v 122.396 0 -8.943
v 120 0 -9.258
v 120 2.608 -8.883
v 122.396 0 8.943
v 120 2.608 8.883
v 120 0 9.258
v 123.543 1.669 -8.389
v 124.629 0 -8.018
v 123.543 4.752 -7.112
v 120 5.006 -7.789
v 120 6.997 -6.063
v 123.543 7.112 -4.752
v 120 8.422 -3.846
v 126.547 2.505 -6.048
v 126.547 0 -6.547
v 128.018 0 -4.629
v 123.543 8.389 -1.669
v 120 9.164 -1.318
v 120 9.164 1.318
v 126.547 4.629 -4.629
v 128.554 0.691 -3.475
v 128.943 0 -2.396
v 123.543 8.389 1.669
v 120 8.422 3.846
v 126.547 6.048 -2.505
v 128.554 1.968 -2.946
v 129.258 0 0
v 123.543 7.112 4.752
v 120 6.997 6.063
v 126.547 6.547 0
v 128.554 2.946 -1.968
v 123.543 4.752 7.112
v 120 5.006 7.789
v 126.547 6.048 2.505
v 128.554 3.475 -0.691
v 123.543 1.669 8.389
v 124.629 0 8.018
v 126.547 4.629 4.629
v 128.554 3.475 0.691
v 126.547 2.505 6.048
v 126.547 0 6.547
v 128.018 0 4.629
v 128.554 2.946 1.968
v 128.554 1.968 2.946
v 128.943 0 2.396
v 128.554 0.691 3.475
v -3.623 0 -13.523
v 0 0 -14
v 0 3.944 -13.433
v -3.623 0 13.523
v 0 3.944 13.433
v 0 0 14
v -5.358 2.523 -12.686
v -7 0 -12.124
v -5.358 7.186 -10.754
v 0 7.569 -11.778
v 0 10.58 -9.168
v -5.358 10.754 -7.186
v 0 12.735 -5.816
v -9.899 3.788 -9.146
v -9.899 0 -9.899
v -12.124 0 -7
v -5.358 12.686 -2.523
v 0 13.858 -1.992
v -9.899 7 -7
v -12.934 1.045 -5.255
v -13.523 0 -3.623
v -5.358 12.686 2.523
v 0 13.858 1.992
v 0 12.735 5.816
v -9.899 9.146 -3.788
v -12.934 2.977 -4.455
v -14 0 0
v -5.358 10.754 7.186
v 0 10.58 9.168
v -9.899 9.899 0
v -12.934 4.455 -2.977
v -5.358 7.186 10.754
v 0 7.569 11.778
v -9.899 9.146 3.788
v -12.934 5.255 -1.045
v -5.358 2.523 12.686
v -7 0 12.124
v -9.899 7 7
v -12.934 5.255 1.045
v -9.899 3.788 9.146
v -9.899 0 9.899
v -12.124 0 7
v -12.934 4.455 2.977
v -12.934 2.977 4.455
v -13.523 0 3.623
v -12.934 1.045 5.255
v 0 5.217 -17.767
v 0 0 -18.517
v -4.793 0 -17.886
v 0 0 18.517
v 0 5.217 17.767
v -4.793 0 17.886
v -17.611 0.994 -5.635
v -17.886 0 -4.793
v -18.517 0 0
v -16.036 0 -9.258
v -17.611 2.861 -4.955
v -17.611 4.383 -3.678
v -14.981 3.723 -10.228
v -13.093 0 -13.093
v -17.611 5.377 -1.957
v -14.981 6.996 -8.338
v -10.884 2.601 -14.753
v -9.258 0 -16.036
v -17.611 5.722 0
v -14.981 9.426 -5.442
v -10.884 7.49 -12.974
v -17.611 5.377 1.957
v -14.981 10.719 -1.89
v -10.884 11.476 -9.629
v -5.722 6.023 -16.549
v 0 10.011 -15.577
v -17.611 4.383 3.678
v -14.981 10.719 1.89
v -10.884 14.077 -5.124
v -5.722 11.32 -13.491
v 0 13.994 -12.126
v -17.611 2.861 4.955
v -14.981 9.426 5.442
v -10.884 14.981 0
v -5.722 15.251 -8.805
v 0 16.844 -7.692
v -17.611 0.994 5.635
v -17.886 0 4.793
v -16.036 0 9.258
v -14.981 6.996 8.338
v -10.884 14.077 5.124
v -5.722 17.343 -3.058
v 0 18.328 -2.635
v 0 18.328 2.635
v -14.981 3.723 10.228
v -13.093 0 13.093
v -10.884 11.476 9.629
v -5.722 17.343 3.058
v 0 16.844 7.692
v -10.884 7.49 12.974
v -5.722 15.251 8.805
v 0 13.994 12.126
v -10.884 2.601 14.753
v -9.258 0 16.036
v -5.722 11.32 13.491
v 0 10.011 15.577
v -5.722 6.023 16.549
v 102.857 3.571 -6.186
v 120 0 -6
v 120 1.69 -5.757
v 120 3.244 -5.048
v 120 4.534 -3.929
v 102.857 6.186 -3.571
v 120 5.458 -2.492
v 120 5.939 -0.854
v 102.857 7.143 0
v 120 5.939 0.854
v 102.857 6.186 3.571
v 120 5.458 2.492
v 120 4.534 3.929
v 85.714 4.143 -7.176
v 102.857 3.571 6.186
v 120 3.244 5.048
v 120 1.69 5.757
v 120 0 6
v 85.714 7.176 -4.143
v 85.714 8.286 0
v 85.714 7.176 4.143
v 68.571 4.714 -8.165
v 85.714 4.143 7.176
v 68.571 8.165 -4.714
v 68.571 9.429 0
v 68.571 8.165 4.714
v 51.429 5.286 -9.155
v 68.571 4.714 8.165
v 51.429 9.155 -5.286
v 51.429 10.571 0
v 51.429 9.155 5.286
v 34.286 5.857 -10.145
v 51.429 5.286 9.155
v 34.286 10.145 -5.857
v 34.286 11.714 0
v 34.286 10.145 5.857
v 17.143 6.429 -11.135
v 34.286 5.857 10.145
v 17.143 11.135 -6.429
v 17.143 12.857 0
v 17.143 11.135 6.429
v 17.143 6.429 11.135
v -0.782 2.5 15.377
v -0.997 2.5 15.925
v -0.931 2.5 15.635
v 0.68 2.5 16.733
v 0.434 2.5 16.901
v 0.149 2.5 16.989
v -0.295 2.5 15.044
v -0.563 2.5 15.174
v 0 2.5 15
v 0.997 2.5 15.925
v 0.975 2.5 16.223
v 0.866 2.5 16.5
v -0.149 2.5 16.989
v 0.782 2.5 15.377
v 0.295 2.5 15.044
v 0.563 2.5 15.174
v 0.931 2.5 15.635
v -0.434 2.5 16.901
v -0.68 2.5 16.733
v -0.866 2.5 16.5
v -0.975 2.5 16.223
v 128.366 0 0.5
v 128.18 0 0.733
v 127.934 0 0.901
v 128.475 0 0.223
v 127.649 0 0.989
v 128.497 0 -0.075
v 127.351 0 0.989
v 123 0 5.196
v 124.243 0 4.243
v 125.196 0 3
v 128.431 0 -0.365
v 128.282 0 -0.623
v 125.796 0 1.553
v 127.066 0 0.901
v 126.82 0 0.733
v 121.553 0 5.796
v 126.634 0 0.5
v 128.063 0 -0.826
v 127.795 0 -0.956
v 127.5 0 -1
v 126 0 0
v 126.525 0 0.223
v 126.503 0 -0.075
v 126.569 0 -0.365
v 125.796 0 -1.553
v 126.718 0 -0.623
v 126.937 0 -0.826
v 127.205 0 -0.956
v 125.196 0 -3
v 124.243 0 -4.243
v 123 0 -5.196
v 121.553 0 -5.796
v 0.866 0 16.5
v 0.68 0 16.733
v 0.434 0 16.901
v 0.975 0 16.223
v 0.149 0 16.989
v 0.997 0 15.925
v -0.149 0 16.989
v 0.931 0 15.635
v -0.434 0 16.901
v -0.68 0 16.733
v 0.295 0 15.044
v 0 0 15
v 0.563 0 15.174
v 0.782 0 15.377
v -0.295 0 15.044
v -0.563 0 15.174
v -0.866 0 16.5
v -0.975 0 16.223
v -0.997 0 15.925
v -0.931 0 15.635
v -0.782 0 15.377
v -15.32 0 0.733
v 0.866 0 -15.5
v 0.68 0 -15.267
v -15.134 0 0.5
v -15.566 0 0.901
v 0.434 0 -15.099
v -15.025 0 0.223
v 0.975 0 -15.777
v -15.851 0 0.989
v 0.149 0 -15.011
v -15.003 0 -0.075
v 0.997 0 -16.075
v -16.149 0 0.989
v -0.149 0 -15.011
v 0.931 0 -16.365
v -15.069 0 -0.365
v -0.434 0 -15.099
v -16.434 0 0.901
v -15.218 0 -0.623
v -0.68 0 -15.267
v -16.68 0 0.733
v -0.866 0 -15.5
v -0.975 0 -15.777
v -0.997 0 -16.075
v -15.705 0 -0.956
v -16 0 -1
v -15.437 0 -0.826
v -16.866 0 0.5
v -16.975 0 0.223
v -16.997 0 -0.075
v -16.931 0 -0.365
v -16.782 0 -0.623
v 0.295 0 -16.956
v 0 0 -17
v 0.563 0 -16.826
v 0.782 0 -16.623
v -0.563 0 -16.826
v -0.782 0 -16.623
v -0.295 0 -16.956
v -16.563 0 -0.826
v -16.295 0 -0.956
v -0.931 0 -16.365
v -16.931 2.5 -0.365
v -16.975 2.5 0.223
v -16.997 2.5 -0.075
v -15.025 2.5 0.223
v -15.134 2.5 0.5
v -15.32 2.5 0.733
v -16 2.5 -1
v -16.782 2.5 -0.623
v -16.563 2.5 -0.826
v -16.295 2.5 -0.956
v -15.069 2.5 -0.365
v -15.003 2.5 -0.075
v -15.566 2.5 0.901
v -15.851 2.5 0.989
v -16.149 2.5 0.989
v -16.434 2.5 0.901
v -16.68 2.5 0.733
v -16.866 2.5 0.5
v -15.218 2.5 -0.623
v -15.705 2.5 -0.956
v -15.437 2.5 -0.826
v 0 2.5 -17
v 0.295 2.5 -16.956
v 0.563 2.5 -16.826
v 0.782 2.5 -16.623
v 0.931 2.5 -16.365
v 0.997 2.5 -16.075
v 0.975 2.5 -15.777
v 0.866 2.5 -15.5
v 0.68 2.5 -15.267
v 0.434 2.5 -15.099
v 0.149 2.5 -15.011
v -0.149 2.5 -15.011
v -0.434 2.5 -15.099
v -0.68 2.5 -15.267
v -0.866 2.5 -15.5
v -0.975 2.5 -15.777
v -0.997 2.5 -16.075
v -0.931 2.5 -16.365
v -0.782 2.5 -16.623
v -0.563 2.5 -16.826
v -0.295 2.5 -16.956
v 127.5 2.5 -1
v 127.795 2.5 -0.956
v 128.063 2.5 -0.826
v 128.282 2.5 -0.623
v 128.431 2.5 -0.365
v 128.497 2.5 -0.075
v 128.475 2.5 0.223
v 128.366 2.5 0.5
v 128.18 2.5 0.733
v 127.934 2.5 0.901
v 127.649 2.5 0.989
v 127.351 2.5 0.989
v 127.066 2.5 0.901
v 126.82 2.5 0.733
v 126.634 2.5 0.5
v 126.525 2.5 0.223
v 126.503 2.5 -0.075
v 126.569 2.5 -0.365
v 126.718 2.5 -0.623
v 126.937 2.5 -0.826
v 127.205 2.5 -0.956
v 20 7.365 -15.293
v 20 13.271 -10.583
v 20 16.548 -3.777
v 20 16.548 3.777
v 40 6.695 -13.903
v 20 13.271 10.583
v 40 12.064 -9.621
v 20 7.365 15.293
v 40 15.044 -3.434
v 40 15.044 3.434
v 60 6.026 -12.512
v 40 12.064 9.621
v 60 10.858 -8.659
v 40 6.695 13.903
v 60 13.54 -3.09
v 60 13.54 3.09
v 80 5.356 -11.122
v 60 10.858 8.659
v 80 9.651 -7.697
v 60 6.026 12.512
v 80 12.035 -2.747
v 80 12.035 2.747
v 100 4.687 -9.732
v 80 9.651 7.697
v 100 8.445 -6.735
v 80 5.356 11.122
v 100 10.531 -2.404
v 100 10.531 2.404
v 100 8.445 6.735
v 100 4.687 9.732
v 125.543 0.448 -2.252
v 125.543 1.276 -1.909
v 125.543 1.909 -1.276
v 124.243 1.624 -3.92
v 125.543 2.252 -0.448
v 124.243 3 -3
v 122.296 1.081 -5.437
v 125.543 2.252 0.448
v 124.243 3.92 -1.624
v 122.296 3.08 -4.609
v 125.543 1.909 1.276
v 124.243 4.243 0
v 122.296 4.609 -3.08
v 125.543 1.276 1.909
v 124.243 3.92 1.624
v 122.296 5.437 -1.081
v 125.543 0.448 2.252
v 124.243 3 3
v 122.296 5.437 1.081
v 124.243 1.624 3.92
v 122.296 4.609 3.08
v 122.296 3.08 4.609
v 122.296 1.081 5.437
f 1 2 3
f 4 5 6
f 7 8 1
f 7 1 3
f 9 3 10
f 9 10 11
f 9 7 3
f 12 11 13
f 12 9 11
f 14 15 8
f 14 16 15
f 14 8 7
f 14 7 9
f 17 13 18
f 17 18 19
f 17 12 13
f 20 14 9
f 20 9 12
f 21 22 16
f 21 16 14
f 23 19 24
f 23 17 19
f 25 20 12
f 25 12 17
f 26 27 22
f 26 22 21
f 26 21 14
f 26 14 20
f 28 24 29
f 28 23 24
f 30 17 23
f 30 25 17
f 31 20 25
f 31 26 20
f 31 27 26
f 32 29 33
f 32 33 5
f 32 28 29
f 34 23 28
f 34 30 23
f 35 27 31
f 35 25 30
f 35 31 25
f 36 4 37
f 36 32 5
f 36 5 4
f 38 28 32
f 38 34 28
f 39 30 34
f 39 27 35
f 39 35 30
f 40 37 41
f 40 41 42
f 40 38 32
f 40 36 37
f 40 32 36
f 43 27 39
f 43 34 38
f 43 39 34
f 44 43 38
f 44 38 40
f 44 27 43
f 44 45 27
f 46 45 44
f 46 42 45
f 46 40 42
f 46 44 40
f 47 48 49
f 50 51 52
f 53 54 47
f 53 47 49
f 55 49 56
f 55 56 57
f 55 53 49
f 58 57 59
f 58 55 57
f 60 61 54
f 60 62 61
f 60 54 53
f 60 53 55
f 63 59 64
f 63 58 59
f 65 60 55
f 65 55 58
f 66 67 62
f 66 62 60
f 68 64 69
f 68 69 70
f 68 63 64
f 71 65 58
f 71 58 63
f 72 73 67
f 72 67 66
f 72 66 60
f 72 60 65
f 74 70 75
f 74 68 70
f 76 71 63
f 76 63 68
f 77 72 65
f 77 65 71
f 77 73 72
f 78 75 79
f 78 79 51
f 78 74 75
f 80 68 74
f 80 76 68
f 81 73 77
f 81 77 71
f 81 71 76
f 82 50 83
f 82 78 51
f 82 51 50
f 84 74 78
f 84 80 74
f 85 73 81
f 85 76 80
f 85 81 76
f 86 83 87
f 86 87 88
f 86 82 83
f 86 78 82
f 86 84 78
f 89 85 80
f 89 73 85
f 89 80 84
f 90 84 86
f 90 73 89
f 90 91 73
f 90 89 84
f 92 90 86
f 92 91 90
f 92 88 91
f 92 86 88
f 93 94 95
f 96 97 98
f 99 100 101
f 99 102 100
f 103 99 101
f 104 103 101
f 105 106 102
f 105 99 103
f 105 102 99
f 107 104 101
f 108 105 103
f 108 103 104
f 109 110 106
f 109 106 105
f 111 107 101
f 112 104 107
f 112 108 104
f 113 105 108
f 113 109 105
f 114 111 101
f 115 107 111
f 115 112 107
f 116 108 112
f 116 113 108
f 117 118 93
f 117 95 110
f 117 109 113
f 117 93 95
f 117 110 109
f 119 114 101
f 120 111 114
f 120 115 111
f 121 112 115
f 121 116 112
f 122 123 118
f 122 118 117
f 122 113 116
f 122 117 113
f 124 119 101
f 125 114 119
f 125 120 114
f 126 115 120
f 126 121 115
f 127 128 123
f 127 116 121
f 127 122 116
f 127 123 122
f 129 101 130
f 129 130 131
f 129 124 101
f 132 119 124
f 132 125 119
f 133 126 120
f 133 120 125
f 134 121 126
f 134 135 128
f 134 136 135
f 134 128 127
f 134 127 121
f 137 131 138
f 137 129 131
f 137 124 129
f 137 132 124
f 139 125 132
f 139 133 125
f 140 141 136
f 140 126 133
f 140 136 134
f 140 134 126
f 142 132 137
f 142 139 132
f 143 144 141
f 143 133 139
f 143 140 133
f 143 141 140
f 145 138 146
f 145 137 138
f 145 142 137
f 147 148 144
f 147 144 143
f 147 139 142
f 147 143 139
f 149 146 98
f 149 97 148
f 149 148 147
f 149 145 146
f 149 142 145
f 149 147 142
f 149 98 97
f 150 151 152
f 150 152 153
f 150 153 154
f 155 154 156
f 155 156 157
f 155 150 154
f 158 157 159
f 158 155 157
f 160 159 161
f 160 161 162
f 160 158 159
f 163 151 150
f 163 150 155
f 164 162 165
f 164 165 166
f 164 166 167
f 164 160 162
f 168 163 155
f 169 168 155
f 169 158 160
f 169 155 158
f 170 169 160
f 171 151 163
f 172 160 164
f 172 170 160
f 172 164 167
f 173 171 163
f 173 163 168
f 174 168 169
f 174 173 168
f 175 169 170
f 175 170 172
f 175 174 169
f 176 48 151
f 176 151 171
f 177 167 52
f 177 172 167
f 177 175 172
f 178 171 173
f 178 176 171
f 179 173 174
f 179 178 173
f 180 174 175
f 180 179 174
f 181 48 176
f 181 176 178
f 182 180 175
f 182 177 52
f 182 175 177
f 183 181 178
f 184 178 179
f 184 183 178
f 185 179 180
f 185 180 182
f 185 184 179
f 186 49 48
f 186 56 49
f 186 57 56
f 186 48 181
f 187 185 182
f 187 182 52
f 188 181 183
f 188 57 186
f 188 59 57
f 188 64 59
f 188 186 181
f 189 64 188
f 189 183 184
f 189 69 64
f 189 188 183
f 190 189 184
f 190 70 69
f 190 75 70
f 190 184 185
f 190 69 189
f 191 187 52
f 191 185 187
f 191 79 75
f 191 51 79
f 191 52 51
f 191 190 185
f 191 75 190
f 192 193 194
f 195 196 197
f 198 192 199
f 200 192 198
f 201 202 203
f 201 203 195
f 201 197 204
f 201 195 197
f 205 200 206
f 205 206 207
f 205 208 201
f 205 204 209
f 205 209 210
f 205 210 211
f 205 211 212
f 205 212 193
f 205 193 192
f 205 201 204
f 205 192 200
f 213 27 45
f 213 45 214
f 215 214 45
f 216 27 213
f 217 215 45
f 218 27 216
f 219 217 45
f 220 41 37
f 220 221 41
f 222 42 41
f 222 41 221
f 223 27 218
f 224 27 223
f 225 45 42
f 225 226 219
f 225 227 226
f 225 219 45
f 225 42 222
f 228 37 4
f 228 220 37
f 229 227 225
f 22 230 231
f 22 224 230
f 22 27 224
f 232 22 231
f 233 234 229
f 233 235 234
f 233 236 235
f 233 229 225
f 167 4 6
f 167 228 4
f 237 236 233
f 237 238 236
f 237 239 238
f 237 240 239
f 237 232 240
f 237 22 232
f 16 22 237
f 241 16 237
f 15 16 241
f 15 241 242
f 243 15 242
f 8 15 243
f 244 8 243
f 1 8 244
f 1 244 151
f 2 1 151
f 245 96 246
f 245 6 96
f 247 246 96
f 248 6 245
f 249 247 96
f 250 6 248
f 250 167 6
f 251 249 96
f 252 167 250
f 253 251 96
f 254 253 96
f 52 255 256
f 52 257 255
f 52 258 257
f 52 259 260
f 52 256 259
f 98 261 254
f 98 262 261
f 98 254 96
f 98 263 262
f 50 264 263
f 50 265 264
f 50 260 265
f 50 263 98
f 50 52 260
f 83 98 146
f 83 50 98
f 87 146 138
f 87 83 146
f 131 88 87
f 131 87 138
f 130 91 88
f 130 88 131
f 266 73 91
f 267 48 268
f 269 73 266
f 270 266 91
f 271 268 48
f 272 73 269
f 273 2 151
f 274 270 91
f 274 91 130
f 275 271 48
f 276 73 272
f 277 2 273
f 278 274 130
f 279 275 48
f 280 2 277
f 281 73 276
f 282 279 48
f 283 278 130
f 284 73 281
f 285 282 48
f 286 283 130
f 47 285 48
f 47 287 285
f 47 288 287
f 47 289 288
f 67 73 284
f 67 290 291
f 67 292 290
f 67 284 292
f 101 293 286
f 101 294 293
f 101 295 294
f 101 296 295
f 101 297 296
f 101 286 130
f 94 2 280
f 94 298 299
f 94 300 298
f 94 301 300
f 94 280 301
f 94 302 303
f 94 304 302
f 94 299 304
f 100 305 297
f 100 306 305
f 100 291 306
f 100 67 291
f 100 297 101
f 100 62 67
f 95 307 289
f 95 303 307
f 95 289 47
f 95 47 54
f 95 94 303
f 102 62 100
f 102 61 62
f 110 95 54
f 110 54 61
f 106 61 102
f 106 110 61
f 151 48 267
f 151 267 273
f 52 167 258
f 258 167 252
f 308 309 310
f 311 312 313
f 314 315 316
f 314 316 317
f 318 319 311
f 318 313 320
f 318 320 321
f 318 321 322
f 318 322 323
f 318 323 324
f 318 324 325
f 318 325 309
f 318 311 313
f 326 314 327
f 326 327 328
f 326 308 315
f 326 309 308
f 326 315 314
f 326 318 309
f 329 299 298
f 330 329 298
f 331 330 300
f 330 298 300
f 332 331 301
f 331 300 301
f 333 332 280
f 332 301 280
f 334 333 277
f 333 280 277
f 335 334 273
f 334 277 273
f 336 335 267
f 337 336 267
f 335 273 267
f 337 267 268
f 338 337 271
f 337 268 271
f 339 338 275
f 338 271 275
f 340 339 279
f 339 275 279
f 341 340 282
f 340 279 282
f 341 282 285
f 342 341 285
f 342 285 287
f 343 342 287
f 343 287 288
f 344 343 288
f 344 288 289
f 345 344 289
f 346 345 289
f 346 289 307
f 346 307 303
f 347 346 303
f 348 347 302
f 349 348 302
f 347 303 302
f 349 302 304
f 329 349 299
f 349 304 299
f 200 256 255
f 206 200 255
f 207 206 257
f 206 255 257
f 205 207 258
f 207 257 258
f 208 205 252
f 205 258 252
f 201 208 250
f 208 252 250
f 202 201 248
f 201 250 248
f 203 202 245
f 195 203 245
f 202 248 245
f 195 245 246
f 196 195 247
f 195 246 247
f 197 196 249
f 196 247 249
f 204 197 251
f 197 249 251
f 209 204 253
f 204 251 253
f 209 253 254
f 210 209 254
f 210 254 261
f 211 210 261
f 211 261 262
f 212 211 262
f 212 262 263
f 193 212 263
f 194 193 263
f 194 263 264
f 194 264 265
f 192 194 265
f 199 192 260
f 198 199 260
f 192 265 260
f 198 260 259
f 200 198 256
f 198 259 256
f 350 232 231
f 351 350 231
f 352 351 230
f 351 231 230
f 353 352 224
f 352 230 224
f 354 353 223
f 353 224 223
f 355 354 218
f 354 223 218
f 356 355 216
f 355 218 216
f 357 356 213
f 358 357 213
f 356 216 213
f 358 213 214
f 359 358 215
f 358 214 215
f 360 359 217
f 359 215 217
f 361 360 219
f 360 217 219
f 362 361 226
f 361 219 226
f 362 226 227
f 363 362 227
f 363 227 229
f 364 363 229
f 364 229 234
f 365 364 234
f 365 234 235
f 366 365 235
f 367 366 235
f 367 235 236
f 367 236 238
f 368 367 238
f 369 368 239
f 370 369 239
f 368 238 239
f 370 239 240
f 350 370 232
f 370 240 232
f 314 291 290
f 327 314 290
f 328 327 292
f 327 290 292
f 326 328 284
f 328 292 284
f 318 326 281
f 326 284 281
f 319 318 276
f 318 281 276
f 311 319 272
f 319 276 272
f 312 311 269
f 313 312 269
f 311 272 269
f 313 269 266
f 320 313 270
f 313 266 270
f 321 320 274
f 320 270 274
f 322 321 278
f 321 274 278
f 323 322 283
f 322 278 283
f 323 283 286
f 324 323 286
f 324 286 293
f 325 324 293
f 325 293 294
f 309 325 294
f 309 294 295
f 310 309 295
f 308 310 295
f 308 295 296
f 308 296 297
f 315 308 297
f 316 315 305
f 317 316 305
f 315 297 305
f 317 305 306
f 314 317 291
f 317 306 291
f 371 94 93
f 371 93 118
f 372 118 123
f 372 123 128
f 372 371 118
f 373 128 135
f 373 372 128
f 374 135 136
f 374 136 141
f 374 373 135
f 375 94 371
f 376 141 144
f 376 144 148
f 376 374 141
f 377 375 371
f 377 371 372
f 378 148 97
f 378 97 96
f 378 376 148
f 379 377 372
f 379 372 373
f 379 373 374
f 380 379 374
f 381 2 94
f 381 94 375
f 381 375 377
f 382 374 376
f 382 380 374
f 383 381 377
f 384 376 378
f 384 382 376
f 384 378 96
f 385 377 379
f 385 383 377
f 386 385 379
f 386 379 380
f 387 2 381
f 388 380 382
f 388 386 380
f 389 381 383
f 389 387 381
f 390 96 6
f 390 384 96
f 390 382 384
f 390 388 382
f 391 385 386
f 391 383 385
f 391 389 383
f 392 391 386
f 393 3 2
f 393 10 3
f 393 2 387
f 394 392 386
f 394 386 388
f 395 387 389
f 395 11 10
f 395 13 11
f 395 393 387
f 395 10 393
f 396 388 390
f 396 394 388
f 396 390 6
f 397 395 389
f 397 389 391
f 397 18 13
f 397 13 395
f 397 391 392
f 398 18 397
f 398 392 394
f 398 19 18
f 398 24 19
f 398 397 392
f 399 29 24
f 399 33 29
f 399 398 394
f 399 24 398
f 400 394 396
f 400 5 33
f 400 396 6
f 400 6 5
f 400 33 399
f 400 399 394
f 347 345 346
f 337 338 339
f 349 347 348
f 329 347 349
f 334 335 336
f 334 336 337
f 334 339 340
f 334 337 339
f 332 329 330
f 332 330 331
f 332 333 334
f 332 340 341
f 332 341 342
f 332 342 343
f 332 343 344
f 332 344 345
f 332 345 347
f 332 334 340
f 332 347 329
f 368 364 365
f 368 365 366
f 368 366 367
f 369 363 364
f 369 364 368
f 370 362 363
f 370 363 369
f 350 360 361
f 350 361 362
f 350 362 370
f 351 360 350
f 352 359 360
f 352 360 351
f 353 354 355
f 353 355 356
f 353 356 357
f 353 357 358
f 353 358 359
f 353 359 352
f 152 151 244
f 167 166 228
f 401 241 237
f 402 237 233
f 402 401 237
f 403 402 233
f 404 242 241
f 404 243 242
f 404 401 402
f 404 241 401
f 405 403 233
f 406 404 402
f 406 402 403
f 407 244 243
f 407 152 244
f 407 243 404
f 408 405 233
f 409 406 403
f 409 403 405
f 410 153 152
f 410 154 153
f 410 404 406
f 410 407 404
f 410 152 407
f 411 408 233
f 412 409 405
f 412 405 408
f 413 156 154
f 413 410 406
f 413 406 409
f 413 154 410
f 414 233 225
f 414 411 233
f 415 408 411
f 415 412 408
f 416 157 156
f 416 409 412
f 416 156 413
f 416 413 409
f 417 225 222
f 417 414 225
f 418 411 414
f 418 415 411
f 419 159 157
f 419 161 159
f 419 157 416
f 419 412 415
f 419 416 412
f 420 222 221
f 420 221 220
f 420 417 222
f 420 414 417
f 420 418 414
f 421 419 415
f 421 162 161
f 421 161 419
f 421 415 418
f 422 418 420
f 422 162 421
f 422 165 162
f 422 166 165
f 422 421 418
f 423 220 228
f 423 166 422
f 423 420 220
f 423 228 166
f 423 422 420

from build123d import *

# Parameters (mm, degrees)
REVOLVE1_ANGLE     = 180
SKETCH3_R          = 1
CUT_EXTRUDE1_DEPTH = 2.5


with BuildPart() as part:
    # Sketch1 → Revolve1 (revolve)
    with BuildSketch(Plane(origin=(0, 0, 0), x_dir=(1, 0, 0), z_dir=(0, 1, 0))):
        with BuildLine():
            Line((0, 18.516950365), (120, 9.258475183))
            ThreePointArc((120, 9.258475183), (126.546730585, 6.546730585), (129.258475183, 0))
            Line((129.258475183, 0), (126, 0))
            ThreePointArc((126, 0), (124.242640687, 4.242640687), (120, 6))
            Line((120, 6), (0, 14))
            ThreePointArc((0, 14), (-9.899494937, 9.899494937), (-14, 0))
            Line((-14, 0), (-18.516950365, 0))
            ThreePointArc((-18.516950365, 0), (-13.09346117, 13.09346117), (0, 18.516950365))
        make_face()
    revolve(axis=Axis((-18.516950365, 0, 0), (1, 0, 0)), revolution_arc=REVOLVE1_ANGLE)

    # Sketch3 → Cut-Extrude1 (cut)
    with BuildSketch(Plane.XZ):
        with Locations(Location((-16, 0, 0), (0, 0, 270))):
            Circle(SKETCH3_R)
        with Locations(Location((0, 16, 0), (0, 0, 270))):
            Circle(SKETCH3_R)
        with Locations(Location((0, -16, 0), (0, 0, 270))):
            Circle(SKETCH3_R)
        with Locations(Location((127.5, 0, 0), (0, 0, 270))):
            Circle(SKETCH3_R)
    extrude(amount=-CUT_EXTRUDE1_DEPTH, mode=Mode.SUBTRACT)


solid = part.part
